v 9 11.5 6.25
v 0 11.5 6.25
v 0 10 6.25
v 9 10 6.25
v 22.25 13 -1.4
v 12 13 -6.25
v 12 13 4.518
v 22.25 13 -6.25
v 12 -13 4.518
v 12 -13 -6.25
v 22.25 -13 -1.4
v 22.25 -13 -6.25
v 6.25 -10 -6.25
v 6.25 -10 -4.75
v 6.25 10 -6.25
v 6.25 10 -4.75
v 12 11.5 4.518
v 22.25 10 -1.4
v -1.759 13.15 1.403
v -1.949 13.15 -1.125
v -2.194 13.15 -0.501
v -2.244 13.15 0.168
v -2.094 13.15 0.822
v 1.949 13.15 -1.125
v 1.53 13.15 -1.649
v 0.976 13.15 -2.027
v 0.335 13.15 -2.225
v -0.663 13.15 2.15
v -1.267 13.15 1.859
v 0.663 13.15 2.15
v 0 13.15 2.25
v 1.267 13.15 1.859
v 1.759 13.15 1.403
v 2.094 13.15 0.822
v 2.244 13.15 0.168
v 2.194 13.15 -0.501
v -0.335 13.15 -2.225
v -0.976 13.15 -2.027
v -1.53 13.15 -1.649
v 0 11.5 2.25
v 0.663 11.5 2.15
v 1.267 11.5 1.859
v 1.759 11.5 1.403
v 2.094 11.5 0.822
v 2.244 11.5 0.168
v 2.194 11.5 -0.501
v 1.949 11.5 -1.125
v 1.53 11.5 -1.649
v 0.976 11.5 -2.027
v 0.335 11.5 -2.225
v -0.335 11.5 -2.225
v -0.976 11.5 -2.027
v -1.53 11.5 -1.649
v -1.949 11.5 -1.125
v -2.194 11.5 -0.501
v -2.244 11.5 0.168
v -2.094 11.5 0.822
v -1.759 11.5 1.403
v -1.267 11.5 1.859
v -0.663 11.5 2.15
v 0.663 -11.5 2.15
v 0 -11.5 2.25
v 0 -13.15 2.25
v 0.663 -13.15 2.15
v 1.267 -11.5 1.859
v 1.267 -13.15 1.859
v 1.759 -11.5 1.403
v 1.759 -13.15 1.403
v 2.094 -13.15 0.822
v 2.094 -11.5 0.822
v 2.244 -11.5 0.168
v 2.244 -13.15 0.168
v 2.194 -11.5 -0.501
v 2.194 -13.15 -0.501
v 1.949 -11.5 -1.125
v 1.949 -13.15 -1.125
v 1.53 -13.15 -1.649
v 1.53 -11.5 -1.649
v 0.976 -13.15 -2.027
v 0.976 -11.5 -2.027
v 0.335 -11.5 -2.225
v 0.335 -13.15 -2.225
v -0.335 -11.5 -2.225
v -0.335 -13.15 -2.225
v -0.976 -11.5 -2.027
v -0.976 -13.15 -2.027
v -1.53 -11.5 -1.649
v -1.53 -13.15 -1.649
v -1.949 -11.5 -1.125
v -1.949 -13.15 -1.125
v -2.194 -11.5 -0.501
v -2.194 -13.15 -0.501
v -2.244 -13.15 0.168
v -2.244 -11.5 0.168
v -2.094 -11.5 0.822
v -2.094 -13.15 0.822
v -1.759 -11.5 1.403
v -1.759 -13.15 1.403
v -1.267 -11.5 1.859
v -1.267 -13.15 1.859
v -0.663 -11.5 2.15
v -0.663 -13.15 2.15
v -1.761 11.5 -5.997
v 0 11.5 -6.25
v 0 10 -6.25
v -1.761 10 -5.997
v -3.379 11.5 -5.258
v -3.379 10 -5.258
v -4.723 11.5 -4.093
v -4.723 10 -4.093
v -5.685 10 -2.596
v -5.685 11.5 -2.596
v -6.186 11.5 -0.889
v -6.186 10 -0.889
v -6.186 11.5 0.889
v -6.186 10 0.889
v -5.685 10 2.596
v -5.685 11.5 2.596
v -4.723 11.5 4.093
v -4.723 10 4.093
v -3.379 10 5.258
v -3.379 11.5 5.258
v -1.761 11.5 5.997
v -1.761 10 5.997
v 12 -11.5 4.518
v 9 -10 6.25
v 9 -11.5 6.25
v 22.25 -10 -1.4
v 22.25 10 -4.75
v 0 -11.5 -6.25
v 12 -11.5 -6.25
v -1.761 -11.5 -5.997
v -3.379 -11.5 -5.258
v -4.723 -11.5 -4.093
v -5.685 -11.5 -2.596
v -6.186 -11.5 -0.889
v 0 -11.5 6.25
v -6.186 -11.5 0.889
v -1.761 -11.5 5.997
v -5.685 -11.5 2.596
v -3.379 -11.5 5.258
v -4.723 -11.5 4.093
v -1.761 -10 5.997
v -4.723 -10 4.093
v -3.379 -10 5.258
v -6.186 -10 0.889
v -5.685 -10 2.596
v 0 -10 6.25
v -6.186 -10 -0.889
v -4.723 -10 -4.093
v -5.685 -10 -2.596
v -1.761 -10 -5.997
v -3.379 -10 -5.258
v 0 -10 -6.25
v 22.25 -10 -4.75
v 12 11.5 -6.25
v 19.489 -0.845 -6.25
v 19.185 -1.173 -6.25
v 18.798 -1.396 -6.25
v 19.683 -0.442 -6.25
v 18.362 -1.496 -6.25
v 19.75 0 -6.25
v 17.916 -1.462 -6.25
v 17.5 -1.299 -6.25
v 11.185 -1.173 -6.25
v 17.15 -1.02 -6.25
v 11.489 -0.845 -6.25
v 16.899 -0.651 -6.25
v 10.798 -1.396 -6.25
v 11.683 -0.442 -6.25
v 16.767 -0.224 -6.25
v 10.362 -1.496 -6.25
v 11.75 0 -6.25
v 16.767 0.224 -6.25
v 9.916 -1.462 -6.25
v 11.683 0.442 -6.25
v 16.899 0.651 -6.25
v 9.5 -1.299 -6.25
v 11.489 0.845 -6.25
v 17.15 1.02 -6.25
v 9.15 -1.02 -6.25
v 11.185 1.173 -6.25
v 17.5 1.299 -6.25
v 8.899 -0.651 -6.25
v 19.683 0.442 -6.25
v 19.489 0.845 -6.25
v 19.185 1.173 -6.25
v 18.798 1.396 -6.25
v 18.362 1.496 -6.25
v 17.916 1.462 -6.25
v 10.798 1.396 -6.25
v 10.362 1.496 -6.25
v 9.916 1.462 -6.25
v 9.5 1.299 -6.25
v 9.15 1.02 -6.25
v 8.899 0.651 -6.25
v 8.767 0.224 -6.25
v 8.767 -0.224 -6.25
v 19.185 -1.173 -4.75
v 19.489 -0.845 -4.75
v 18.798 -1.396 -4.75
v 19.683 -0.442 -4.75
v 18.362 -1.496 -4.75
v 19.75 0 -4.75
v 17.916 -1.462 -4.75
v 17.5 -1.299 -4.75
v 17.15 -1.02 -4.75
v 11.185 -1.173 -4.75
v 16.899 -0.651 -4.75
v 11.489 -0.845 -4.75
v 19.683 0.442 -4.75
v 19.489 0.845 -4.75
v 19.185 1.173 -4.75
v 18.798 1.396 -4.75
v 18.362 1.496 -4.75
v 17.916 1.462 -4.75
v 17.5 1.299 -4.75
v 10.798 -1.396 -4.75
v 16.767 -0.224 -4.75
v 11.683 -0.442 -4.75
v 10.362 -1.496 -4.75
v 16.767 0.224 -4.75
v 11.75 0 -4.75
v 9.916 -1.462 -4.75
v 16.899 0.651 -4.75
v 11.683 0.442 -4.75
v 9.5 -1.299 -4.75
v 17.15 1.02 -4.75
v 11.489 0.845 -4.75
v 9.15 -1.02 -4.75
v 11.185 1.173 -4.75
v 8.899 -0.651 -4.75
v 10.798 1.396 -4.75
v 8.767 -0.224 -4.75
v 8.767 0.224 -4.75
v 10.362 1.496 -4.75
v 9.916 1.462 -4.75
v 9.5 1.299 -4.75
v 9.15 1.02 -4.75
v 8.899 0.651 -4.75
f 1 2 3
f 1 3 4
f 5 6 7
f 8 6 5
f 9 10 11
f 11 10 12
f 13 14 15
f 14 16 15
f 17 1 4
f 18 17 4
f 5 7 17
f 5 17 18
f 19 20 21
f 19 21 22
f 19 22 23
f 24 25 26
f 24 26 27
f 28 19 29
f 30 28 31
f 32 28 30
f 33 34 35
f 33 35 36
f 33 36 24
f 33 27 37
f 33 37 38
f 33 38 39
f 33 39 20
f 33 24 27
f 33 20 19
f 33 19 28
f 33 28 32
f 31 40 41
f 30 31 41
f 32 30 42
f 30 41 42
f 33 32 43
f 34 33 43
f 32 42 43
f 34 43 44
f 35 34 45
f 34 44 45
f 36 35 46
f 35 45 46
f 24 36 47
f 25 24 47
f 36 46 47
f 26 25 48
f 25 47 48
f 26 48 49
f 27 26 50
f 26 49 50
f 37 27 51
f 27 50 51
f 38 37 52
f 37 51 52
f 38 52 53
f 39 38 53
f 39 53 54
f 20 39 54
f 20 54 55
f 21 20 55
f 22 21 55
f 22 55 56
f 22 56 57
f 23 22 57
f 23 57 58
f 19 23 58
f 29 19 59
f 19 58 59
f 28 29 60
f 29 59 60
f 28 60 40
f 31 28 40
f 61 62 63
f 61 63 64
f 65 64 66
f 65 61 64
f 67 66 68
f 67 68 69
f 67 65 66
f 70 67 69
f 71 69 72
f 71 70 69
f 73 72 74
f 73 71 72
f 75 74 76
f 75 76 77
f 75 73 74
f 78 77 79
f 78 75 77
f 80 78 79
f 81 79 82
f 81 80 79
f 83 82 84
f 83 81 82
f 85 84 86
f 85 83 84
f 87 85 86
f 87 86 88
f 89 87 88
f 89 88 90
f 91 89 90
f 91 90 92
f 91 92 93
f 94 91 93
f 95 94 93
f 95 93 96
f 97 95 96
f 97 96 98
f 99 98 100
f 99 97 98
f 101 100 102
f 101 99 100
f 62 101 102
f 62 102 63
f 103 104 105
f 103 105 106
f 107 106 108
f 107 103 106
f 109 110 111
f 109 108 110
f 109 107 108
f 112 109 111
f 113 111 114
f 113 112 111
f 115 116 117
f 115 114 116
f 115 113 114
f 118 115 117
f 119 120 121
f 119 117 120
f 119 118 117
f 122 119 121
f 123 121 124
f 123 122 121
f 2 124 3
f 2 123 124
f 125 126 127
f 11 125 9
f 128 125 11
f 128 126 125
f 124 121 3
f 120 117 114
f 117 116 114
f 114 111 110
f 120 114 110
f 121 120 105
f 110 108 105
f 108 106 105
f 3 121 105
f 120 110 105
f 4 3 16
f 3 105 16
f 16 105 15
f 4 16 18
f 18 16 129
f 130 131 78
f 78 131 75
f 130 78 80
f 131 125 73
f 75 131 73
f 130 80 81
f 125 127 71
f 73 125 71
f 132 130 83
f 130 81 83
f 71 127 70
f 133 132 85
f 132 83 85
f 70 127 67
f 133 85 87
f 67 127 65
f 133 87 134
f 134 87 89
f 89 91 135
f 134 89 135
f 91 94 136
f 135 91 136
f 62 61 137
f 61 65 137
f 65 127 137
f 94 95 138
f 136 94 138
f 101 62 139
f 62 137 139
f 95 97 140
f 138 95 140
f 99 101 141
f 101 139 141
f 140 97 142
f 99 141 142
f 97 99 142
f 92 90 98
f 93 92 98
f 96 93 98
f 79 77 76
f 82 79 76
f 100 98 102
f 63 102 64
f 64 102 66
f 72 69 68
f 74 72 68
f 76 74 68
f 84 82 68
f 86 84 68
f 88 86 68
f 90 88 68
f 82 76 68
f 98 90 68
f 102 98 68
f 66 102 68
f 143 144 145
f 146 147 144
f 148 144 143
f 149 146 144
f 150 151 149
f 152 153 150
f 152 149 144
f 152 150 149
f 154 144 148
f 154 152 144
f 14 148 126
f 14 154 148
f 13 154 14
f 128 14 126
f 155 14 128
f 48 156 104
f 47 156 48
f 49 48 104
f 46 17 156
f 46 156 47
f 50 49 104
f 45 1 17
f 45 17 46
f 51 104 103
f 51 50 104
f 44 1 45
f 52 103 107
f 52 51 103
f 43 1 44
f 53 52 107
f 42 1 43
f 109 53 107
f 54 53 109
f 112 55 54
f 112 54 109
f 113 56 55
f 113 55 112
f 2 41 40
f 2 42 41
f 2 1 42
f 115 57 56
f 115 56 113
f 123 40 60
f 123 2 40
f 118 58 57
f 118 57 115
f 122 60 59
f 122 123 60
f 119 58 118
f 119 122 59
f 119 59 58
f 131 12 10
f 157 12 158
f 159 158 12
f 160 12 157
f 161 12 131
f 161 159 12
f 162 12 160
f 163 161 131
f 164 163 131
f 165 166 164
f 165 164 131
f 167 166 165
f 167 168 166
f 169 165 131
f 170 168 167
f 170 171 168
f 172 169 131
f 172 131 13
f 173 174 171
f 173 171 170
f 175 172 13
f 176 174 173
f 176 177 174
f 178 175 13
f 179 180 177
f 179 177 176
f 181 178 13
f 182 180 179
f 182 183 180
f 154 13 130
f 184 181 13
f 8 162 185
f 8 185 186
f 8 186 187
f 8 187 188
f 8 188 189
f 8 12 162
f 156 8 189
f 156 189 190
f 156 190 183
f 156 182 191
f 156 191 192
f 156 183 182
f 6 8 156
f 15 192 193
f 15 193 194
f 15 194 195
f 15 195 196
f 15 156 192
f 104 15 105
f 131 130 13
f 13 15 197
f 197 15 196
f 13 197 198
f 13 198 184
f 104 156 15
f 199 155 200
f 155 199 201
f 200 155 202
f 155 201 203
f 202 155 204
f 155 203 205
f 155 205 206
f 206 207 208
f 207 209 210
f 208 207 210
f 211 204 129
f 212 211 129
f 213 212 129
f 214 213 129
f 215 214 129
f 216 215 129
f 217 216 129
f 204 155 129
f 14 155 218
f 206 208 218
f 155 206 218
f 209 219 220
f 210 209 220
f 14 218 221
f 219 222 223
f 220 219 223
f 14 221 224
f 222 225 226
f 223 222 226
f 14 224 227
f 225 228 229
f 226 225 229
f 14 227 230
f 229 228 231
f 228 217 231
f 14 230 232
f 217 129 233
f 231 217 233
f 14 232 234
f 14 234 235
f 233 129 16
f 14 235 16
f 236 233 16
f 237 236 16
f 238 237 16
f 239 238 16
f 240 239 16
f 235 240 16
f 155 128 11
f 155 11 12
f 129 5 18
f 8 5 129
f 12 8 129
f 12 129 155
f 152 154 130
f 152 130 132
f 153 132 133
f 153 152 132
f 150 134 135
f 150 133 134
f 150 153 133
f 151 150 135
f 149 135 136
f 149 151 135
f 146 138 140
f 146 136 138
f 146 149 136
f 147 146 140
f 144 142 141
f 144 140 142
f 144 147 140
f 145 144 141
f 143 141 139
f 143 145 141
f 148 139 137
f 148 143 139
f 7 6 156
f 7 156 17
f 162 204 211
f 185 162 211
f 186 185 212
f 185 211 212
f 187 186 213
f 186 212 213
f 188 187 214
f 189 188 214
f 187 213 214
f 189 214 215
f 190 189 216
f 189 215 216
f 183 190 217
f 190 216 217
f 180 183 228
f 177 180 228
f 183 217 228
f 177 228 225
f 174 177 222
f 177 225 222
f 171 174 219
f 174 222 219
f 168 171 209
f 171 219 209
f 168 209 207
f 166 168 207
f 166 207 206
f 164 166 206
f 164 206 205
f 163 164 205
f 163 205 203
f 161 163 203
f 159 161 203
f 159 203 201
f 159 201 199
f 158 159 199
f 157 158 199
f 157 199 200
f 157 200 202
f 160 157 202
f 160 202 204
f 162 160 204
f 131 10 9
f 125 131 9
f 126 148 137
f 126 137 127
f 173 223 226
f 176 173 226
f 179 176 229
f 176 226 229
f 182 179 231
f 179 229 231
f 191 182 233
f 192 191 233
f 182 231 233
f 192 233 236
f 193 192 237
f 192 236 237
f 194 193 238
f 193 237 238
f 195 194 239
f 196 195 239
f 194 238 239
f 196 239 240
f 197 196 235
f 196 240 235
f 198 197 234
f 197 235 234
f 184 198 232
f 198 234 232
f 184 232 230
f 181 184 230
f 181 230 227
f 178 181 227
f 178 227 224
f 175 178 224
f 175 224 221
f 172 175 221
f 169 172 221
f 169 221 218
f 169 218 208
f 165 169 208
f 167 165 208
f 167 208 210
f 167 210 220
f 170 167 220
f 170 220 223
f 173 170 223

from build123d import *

# Parameters (mm, degrees)
BOSS_EXTRUDE1_DEPTH          = 13
CUT_EXTRUDE1_DEPTH           = 10
SKETCH3_W                    = 18.25
SKETCH3_H                    = 12.5
CUT_EXTRUDE2_DEPTH           = 1.5
SKETCH7_R                    = 2.25
BOSS_EXTRUDE2_DEPTH          = 1.65
F_3_0_3_DIAMETER_HOLE1_D     = 3
F_3_0_3_DIAMETER_HOLE1_DEPTH = 12.5


with BuildPart() as part:
    # Sketch1 → Boss-Extrude1 (new, symmetric)
    with BuildSketch(Plane(origin=(0, 0, 0), x_dir=(1, 0, 0), z_dir=(0, 1, 0))):
        with BuildLine():
            Line((9, -6.25), (22.25, 1.399891067))
            Line((22.25, 1.399891067), (22.25, 6.25))
            Line((22.25, 6.25), (0, 6.25))
            ThreePointArc((0, 6.25), (-6.25, 0), (0, -6.25))
            Line((0, -6.25), (9, -6.25))
        make_face()
    extrude(amount=BOSS_EXTRUDE1_DEPTH, both=True)

    # Sketch2 → Cut-Extrude1 (cut, symmetric)
    with BuildSketch(Plane(origin=(0, 0, 0), x_dir=(1, 0, 0), z_dir=(0, 1, 0))):
        Polygon((6.25, 4.75), (6.25, 6.25), (-6.25, 6.25), (-6.25, -6.25), (22.25, -6.25), (22.25, 4.75), align=None)
    extrude(amount=CUT_EXTRUDE1_DEPTH, both=True, mode=Mode.SUBTRACT)

    # Sketch3 → Cut-Extrude2 (cut)
    with BuildSketch(Plane(origin=(0, 13, 0), x_dir=(-1, 0, 0), z_dir=(0, 1, 0))):
        with Locations((-2.875, 0)):
            Rectangle(SKETCH3_W, SKETCH3_H)
    cut_extrude2 = extrude(amount=-CUT_EXTRUDE2_DEPTH, mode=Mode.SUBTRACT)

    # Mirror1: Cut-Extrude2 across plane
    add(cut_extrude2.mirror(Plane.ZX), mode=Mode.SUBTRACT)

    # Sketch7 → Boss-Extrude2 (add)
    with BuildSketch(Plane(origin=(0, 11.5, 0), x_dir=(-1, 0, 0), z_dir=(0, 1, 0))):
        with Locations(Location((0, 0, 0), (0, 0, 90))):
            Circle(SKETCH7_R)
    boss_extrude2 = extrude(amount=BOSS_EXTRUDE2_DEPTH)

    # Mirror2: Boss-Extrude2 across plane
    add(boss_extrude2.mirror(Plane.ZX))

    # Ø3.0 (3) Diameter Hole1
    with Locations(Plane(origin=(0, 0, -6.25), x_dir=(-1, 0, 0), z_dir=(0, 0, -1))):
        with Locations((-10.25, 0), (-18.25, 0)):
            Hole(F_3_0_3_DIAMETER_HOLE1_D / 2, depth=F_3_0_3_DIAMETER_HOLE1_DEPTH)


solid = part.part
